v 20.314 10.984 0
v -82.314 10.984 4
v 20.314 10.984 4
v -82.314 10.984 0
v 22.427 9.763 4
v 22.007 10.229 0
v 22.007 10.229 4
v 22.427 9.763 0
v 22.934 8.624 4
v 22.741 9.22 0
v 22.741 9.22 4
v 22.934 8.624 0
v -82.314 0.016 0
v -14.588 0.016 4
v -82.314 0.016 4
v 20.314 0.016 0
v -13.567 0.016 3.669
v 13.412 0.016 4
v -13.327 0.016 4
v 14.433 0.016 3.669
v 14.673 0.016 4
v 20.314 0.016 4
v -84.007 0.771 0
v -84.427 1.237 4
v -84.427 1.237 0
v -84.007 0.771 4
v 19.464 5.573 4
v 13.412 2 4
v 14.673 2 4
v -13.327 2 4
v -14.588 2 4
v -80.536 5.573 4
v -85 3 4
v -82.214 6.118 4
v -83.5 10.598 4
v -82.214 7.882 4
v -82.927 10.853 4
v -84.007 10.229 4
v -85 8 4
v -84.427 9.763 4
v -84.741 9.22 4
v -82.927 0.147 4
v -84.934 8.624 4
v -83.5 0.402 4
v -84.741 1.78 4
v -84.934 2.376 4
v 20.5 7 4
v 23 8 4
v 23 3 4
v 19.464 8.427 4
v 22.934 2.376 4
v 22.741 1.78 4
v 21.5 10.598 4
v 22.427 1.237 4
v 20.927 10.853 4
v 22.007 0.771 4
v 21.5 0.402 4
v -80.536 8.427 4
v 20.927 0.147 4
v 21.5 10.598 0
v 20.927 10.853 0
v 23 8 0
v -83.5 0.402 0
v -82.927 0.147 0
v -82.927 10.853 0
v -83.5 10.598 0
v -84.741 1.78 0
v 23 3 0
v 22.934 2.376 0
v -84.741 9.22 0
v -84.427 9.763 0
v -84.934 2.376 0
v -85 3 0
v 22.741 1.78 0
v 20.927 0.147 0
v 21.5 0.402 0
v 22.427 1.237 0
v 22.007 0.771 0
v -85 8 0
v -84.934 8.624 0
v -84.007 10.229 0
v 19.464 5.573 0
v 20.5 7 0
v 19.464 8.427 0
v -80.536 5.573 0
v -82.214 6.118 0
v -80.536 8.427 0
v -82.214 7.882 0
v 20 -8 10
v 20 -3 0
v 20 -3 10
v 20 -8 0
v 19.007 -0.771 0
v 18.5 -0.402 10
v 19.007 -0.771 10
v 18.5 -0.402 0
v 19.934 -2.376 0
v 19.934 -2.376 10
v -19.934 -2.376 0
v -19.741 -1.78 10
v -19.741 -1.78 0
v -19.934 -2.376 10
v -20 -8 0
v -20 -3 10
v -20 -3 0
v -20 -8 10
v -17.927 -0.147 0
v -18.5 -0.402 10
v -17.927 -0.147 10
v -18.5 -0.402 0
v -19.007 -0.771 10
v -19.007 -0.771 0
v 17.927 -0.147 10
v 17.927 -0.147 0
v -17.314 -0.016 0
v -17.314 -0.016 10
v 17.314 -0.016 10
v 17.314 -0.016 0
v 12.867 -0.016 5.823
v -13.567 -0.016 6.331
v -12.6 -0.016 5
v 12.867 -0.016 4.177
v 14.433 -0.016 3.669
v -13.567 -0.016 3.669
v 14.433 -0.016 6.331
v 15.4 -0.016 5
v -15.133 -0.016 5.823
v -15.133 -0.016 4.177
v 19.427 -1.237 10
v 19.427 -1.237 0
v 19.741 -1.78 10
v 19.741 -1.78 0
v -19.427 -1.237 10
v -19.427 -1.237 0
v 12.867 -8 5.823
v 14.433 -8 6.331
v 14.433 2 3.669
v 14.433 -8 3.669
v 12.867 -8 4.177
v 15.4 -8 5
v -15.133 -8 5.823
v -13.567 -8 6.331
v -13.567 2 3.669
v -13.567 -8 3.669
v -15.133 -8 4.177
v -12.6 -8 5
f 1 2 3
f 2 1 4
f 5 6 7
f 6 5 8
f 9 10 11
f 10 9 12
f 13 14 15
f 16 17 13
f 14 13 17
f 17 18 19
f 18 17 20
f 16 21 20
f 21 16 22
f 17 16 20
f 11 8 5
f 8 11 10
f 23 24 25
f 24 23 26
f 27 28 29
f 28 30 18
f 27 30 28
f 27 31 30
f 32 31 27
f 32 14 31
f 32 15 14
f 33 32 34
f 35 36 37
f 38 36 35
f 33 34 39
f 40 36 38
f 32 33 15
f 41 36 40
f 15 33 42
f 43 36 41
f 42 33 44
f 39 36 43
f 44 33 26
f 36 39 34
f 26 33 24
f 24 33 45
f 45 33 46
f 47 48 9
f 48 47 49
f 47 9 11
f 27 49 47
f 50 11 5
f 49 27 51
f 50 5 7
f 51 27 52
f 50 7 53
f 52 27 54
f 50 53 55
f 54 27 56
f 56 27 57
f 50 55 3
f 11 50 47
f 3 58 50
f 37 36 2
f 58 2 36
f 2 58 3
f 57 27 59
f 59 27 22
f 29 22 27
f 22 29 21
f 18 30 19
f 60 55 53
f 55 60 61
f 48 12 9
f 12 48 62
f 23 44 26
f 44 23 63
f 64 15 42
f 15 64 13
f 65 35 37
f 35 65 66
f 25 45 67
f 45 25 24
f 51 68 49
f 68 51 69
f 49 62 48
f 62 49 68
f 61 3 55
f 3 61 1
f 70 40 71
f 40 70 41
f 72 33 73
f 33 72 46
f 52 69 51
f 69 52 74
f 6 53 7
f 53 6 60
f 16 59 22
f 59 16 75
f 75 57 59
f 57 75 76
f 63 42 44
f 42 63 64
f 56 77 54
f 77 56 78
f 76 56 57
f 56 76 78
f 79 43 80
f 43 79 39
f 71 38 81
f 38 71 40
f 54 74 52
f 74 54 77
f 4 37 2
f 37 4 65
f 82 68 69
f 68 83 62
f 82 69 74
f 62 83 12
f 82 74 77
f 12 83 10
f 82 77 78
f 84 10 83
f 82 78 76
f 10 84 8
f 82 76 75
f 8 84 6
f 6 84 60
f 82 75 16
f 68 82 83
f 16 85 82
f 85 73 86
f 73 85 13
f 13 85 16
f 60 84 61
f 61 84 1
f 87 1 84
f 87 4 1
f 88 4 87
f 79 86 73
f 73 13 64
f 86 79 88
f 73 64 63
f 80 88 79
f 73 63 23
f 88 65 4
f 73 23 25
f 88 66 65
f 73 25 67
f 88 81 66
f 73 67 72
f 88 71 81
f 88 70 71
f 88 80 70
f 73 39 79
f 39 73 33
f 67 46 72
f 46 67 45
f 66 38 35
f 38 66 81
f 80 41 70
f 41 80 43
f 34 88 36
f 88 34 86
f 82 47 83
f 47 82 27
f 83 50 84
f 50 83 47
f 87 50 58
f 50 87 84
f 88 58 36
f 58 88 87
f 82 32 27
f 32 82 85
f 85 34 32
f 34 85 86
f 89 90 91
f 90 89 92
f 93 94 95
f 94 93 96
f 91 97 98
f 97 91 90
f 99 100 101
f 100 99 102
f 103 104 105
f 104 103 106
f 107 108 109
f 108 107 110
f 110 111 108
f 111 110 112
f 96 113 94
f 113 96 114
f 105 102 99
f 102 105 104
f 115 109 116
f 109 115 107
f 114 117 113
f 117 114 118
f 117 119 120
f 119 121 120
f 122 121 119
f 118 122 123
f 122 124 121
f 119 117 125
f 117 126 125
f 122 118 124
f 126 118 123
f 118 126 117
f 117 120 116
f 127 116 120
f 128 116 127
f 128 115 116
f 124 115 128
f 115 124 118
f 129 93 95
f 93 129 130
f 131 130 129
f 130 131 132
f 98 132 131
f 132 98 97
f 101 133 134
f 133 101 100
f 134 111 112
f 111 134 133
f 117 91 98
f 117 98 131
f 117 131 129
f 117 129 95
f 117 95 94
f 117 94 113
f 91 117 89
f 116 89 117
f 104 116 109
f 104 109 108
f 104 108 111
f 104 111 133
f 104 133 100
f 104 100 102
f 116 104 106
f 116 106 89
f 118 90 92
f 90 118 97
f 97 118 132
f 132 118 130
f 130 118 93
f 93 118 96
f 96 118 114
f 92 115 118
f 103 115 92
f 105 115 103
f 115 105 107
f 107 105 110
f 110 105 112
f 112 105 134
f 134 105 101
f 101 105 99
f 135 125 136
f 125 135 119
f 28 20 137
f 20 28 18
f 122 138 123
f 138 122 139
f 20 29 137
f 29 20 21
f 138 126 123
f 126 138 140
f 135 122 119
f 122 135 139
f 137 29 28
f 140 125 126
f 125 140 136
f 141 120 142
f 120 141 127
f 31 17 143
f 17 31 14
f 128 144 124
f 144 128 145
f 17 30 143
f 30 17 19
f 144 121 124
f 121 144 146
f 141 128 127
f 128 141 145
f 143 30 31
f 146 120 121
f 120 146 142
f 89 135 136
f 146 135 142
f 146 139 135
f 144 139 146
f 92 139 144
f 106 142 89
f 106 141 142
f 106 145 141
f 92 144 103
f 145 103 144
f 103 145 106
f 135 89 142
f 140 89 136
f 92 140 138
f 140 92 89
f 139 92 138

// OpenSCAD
// file: common_parts.scad
include <tunable_constants.scad>;
//common_flat_screw_tap();
module M3_flat_screw(l = 10, l2 = 0) {
    // l2 is amount of the screw that are bigger for sliding through the hole
    tap_z = 1.9;
    rotate([180,0,0])
    union() {
        cylinder(d = C_M3_DIAMETER_THREAD, h= l);
        cylinder(d = C_M3_DIAMETER, h= l2);
        translate([0,0,-0.1+0.1]) cylinder(d1 = 6.5, d2= C_M3_DIAMETER_THREAD, h= tap_z);
        translate([0,0,-0.1]) cylinder(d = 6.5, h= 0.3);
    }
}

module M4_button_screw(l = 10, l2 = 0) {
    rotate([180,0,0])
    union() {
        cylinder(d = C_M4_DIAMETER_THREAD, h= l);
        cylinder(d = C_M4_DIAMETER, h= l2);
        translate([0,0,-4]) cylinder(d = 8, h=4);
    }
}
module M3_button_screw(l = 10, l2 = 0) {
    rotate([180,0,0])
    union() {
        cylinder(d = C_M3_DIAMETER_THREAD, h= l);
        cylinder(d = C_M3_DIAMETER, h= l2);
        translate([0,0,-4]) cylinder(d =6, h=4);
    }
}

module roundedcube(xdim ,ydim ,zdim,rdim){
    hull(){
        fn=30;
        translate([rdim,rdim,0]) cylinder(r=rdim, h=zdim, $fn=fn);
        translate([xdim-rdim,rdim,0])cylinder(r=rdim, h=zdim, $fn=fn);

        translate([rdim,ydim-rdim,0]) cylinder(r=rdim, h=zdim, $fn=fn);
        translate([xdim-rdim,ydim-rdim,0]) cylinder(r=rdim, h=zdim, $fn=fn);
    }
}
//beam45();
module beam45(w = 10, l = 10, h = 8) {
    difference() {
        union() {
            translate([-w/2,0,0]) cube([w,l,h]);
        }
        translate([w/2,0,0]) rotate([0,45,0])translate([-w-h,-1,0]) cube([w+h*2,l+2,h*2]);
        translate([-w/2,0,0]) rotate([0,-45,0])translate([0-w,-1,0]) cube([w+h*2,l+2,h*2]);
    }
}
//beam30();
module beam30(w = 10, l = 10, h = 8) {
    difference() {
        union() {
            translate([-w/2,0,0]) cube([w,l,h]);
        }
        translate([w/2,0,0]) rotate([0,90-30,0])translate([-w-h,-1,0]) cube([w+h*2,l+2,h*2]);
        translate([-w/2,0,0]) rotate([0,-90+30,0])translate([0-w,-1,0]) cube([w+h*2,l+2,h*2]);
    }
}


module cylinder_outer(height,radius,fn){
   fudge = 1/cos(180/fn);
   cylinder(h=height,r=radius*fudge,$fn=fn);
}

//indicator_dots(2);

module indicator_dots(valueIn) {
    for (a =[0:1:valueIn-1]) {
        translate([a*3,0,0]) cube([2,2,1]);
    }
}
// file: tunable_constants.scad
// Change parameters to fit your printer and slicer differences

C_M3_DIAMETER = 3.3; // size of a hole that a M3 screw will slide through
C_M3_DIAMETER_THREAD = 2.8; // size of a hole that a M3 screw will create own threads in

C_M3_NUT = 7;

C_KINGPIN_LOOSE = 3.5; // The hole for kingpin in the arms that are suposed to slide
C_KINGPIN_SNUG = 3.3; // The hole in the steering hub where the kingpin is suposed to be tightly locked with a screw

C_M4_NUT = 8.4;

C_M4_DIAMETER = 4.1; // size of a hole that a M4 screw will slide through
C_M4_DIAMETER_THREAD = 3.8; // size of a hole that a M4 screw will create own threads in

    b_12mm_tol = 0.3; // tolerance for bearing with 12mm diameter

C_12MM_BEARING_D = 12+b_12mm_tol; // Size of a hole that hold a 12mm bearing
C_12MM_BEARING_H = 3.5;

C_8MM_LOOSE = 8.7; // Loose fitting that will guarantie that it will not touch
C_8MM_TIGHT = 8.2; // Tight fitting for indrive etc
C_8MM_FIT = 8.5; // Perfect fit for it to be removable but not by much force, used for left wheel mount

C_SIGHT_MOUNT_S = 33.3375;

C_MOUNT1_W = 28;
// ############# Settings ################
S_CASTER = 4;
S_CAMBER = 2;

S_BAR_W = 20;
S_BAR_H = 5;
// main file
//
include <tunable_constants.scad>;
use <common_parts.scad>

wall = 4;
w = 3+wall*2;
h = 4;
l = 100;


// mounting to sight part
c_h = 10;
c_w = 40;


prim_base_p();

module prim_base_p() {
    difference() {
        union() {
            translate([-85,0,0]) stick();
            translate([-20,-20,0]) roundedcube(c_w,20,c_h,3);
        }
        screws();
        translate([-20,-28,0]) cube([c_w,20,c_h]);
    }
}

module stick() {
    difference() {
        union() {
            roundedcube(l+wall*2, w, h,3);
            
        }
        hull() {
            translate([wall+0,w-wall,0]) cylinder(d=3, h=h);
            translate([wall+l,w-wall,0]) cylinder(d=3, h=h);
        }
    }
}
%screws();
module screws() {

    translate([C_MOUNT1_W/2,-28,c_h/2]) rotate([90,0,0]) M3_button_screw(l=30,l2=0);
    translate([-C_MOUNT1_W/2,-28,c_h/2]) rotate([90,0,0]) M3_button_screw(l=30,l2=0);
}
